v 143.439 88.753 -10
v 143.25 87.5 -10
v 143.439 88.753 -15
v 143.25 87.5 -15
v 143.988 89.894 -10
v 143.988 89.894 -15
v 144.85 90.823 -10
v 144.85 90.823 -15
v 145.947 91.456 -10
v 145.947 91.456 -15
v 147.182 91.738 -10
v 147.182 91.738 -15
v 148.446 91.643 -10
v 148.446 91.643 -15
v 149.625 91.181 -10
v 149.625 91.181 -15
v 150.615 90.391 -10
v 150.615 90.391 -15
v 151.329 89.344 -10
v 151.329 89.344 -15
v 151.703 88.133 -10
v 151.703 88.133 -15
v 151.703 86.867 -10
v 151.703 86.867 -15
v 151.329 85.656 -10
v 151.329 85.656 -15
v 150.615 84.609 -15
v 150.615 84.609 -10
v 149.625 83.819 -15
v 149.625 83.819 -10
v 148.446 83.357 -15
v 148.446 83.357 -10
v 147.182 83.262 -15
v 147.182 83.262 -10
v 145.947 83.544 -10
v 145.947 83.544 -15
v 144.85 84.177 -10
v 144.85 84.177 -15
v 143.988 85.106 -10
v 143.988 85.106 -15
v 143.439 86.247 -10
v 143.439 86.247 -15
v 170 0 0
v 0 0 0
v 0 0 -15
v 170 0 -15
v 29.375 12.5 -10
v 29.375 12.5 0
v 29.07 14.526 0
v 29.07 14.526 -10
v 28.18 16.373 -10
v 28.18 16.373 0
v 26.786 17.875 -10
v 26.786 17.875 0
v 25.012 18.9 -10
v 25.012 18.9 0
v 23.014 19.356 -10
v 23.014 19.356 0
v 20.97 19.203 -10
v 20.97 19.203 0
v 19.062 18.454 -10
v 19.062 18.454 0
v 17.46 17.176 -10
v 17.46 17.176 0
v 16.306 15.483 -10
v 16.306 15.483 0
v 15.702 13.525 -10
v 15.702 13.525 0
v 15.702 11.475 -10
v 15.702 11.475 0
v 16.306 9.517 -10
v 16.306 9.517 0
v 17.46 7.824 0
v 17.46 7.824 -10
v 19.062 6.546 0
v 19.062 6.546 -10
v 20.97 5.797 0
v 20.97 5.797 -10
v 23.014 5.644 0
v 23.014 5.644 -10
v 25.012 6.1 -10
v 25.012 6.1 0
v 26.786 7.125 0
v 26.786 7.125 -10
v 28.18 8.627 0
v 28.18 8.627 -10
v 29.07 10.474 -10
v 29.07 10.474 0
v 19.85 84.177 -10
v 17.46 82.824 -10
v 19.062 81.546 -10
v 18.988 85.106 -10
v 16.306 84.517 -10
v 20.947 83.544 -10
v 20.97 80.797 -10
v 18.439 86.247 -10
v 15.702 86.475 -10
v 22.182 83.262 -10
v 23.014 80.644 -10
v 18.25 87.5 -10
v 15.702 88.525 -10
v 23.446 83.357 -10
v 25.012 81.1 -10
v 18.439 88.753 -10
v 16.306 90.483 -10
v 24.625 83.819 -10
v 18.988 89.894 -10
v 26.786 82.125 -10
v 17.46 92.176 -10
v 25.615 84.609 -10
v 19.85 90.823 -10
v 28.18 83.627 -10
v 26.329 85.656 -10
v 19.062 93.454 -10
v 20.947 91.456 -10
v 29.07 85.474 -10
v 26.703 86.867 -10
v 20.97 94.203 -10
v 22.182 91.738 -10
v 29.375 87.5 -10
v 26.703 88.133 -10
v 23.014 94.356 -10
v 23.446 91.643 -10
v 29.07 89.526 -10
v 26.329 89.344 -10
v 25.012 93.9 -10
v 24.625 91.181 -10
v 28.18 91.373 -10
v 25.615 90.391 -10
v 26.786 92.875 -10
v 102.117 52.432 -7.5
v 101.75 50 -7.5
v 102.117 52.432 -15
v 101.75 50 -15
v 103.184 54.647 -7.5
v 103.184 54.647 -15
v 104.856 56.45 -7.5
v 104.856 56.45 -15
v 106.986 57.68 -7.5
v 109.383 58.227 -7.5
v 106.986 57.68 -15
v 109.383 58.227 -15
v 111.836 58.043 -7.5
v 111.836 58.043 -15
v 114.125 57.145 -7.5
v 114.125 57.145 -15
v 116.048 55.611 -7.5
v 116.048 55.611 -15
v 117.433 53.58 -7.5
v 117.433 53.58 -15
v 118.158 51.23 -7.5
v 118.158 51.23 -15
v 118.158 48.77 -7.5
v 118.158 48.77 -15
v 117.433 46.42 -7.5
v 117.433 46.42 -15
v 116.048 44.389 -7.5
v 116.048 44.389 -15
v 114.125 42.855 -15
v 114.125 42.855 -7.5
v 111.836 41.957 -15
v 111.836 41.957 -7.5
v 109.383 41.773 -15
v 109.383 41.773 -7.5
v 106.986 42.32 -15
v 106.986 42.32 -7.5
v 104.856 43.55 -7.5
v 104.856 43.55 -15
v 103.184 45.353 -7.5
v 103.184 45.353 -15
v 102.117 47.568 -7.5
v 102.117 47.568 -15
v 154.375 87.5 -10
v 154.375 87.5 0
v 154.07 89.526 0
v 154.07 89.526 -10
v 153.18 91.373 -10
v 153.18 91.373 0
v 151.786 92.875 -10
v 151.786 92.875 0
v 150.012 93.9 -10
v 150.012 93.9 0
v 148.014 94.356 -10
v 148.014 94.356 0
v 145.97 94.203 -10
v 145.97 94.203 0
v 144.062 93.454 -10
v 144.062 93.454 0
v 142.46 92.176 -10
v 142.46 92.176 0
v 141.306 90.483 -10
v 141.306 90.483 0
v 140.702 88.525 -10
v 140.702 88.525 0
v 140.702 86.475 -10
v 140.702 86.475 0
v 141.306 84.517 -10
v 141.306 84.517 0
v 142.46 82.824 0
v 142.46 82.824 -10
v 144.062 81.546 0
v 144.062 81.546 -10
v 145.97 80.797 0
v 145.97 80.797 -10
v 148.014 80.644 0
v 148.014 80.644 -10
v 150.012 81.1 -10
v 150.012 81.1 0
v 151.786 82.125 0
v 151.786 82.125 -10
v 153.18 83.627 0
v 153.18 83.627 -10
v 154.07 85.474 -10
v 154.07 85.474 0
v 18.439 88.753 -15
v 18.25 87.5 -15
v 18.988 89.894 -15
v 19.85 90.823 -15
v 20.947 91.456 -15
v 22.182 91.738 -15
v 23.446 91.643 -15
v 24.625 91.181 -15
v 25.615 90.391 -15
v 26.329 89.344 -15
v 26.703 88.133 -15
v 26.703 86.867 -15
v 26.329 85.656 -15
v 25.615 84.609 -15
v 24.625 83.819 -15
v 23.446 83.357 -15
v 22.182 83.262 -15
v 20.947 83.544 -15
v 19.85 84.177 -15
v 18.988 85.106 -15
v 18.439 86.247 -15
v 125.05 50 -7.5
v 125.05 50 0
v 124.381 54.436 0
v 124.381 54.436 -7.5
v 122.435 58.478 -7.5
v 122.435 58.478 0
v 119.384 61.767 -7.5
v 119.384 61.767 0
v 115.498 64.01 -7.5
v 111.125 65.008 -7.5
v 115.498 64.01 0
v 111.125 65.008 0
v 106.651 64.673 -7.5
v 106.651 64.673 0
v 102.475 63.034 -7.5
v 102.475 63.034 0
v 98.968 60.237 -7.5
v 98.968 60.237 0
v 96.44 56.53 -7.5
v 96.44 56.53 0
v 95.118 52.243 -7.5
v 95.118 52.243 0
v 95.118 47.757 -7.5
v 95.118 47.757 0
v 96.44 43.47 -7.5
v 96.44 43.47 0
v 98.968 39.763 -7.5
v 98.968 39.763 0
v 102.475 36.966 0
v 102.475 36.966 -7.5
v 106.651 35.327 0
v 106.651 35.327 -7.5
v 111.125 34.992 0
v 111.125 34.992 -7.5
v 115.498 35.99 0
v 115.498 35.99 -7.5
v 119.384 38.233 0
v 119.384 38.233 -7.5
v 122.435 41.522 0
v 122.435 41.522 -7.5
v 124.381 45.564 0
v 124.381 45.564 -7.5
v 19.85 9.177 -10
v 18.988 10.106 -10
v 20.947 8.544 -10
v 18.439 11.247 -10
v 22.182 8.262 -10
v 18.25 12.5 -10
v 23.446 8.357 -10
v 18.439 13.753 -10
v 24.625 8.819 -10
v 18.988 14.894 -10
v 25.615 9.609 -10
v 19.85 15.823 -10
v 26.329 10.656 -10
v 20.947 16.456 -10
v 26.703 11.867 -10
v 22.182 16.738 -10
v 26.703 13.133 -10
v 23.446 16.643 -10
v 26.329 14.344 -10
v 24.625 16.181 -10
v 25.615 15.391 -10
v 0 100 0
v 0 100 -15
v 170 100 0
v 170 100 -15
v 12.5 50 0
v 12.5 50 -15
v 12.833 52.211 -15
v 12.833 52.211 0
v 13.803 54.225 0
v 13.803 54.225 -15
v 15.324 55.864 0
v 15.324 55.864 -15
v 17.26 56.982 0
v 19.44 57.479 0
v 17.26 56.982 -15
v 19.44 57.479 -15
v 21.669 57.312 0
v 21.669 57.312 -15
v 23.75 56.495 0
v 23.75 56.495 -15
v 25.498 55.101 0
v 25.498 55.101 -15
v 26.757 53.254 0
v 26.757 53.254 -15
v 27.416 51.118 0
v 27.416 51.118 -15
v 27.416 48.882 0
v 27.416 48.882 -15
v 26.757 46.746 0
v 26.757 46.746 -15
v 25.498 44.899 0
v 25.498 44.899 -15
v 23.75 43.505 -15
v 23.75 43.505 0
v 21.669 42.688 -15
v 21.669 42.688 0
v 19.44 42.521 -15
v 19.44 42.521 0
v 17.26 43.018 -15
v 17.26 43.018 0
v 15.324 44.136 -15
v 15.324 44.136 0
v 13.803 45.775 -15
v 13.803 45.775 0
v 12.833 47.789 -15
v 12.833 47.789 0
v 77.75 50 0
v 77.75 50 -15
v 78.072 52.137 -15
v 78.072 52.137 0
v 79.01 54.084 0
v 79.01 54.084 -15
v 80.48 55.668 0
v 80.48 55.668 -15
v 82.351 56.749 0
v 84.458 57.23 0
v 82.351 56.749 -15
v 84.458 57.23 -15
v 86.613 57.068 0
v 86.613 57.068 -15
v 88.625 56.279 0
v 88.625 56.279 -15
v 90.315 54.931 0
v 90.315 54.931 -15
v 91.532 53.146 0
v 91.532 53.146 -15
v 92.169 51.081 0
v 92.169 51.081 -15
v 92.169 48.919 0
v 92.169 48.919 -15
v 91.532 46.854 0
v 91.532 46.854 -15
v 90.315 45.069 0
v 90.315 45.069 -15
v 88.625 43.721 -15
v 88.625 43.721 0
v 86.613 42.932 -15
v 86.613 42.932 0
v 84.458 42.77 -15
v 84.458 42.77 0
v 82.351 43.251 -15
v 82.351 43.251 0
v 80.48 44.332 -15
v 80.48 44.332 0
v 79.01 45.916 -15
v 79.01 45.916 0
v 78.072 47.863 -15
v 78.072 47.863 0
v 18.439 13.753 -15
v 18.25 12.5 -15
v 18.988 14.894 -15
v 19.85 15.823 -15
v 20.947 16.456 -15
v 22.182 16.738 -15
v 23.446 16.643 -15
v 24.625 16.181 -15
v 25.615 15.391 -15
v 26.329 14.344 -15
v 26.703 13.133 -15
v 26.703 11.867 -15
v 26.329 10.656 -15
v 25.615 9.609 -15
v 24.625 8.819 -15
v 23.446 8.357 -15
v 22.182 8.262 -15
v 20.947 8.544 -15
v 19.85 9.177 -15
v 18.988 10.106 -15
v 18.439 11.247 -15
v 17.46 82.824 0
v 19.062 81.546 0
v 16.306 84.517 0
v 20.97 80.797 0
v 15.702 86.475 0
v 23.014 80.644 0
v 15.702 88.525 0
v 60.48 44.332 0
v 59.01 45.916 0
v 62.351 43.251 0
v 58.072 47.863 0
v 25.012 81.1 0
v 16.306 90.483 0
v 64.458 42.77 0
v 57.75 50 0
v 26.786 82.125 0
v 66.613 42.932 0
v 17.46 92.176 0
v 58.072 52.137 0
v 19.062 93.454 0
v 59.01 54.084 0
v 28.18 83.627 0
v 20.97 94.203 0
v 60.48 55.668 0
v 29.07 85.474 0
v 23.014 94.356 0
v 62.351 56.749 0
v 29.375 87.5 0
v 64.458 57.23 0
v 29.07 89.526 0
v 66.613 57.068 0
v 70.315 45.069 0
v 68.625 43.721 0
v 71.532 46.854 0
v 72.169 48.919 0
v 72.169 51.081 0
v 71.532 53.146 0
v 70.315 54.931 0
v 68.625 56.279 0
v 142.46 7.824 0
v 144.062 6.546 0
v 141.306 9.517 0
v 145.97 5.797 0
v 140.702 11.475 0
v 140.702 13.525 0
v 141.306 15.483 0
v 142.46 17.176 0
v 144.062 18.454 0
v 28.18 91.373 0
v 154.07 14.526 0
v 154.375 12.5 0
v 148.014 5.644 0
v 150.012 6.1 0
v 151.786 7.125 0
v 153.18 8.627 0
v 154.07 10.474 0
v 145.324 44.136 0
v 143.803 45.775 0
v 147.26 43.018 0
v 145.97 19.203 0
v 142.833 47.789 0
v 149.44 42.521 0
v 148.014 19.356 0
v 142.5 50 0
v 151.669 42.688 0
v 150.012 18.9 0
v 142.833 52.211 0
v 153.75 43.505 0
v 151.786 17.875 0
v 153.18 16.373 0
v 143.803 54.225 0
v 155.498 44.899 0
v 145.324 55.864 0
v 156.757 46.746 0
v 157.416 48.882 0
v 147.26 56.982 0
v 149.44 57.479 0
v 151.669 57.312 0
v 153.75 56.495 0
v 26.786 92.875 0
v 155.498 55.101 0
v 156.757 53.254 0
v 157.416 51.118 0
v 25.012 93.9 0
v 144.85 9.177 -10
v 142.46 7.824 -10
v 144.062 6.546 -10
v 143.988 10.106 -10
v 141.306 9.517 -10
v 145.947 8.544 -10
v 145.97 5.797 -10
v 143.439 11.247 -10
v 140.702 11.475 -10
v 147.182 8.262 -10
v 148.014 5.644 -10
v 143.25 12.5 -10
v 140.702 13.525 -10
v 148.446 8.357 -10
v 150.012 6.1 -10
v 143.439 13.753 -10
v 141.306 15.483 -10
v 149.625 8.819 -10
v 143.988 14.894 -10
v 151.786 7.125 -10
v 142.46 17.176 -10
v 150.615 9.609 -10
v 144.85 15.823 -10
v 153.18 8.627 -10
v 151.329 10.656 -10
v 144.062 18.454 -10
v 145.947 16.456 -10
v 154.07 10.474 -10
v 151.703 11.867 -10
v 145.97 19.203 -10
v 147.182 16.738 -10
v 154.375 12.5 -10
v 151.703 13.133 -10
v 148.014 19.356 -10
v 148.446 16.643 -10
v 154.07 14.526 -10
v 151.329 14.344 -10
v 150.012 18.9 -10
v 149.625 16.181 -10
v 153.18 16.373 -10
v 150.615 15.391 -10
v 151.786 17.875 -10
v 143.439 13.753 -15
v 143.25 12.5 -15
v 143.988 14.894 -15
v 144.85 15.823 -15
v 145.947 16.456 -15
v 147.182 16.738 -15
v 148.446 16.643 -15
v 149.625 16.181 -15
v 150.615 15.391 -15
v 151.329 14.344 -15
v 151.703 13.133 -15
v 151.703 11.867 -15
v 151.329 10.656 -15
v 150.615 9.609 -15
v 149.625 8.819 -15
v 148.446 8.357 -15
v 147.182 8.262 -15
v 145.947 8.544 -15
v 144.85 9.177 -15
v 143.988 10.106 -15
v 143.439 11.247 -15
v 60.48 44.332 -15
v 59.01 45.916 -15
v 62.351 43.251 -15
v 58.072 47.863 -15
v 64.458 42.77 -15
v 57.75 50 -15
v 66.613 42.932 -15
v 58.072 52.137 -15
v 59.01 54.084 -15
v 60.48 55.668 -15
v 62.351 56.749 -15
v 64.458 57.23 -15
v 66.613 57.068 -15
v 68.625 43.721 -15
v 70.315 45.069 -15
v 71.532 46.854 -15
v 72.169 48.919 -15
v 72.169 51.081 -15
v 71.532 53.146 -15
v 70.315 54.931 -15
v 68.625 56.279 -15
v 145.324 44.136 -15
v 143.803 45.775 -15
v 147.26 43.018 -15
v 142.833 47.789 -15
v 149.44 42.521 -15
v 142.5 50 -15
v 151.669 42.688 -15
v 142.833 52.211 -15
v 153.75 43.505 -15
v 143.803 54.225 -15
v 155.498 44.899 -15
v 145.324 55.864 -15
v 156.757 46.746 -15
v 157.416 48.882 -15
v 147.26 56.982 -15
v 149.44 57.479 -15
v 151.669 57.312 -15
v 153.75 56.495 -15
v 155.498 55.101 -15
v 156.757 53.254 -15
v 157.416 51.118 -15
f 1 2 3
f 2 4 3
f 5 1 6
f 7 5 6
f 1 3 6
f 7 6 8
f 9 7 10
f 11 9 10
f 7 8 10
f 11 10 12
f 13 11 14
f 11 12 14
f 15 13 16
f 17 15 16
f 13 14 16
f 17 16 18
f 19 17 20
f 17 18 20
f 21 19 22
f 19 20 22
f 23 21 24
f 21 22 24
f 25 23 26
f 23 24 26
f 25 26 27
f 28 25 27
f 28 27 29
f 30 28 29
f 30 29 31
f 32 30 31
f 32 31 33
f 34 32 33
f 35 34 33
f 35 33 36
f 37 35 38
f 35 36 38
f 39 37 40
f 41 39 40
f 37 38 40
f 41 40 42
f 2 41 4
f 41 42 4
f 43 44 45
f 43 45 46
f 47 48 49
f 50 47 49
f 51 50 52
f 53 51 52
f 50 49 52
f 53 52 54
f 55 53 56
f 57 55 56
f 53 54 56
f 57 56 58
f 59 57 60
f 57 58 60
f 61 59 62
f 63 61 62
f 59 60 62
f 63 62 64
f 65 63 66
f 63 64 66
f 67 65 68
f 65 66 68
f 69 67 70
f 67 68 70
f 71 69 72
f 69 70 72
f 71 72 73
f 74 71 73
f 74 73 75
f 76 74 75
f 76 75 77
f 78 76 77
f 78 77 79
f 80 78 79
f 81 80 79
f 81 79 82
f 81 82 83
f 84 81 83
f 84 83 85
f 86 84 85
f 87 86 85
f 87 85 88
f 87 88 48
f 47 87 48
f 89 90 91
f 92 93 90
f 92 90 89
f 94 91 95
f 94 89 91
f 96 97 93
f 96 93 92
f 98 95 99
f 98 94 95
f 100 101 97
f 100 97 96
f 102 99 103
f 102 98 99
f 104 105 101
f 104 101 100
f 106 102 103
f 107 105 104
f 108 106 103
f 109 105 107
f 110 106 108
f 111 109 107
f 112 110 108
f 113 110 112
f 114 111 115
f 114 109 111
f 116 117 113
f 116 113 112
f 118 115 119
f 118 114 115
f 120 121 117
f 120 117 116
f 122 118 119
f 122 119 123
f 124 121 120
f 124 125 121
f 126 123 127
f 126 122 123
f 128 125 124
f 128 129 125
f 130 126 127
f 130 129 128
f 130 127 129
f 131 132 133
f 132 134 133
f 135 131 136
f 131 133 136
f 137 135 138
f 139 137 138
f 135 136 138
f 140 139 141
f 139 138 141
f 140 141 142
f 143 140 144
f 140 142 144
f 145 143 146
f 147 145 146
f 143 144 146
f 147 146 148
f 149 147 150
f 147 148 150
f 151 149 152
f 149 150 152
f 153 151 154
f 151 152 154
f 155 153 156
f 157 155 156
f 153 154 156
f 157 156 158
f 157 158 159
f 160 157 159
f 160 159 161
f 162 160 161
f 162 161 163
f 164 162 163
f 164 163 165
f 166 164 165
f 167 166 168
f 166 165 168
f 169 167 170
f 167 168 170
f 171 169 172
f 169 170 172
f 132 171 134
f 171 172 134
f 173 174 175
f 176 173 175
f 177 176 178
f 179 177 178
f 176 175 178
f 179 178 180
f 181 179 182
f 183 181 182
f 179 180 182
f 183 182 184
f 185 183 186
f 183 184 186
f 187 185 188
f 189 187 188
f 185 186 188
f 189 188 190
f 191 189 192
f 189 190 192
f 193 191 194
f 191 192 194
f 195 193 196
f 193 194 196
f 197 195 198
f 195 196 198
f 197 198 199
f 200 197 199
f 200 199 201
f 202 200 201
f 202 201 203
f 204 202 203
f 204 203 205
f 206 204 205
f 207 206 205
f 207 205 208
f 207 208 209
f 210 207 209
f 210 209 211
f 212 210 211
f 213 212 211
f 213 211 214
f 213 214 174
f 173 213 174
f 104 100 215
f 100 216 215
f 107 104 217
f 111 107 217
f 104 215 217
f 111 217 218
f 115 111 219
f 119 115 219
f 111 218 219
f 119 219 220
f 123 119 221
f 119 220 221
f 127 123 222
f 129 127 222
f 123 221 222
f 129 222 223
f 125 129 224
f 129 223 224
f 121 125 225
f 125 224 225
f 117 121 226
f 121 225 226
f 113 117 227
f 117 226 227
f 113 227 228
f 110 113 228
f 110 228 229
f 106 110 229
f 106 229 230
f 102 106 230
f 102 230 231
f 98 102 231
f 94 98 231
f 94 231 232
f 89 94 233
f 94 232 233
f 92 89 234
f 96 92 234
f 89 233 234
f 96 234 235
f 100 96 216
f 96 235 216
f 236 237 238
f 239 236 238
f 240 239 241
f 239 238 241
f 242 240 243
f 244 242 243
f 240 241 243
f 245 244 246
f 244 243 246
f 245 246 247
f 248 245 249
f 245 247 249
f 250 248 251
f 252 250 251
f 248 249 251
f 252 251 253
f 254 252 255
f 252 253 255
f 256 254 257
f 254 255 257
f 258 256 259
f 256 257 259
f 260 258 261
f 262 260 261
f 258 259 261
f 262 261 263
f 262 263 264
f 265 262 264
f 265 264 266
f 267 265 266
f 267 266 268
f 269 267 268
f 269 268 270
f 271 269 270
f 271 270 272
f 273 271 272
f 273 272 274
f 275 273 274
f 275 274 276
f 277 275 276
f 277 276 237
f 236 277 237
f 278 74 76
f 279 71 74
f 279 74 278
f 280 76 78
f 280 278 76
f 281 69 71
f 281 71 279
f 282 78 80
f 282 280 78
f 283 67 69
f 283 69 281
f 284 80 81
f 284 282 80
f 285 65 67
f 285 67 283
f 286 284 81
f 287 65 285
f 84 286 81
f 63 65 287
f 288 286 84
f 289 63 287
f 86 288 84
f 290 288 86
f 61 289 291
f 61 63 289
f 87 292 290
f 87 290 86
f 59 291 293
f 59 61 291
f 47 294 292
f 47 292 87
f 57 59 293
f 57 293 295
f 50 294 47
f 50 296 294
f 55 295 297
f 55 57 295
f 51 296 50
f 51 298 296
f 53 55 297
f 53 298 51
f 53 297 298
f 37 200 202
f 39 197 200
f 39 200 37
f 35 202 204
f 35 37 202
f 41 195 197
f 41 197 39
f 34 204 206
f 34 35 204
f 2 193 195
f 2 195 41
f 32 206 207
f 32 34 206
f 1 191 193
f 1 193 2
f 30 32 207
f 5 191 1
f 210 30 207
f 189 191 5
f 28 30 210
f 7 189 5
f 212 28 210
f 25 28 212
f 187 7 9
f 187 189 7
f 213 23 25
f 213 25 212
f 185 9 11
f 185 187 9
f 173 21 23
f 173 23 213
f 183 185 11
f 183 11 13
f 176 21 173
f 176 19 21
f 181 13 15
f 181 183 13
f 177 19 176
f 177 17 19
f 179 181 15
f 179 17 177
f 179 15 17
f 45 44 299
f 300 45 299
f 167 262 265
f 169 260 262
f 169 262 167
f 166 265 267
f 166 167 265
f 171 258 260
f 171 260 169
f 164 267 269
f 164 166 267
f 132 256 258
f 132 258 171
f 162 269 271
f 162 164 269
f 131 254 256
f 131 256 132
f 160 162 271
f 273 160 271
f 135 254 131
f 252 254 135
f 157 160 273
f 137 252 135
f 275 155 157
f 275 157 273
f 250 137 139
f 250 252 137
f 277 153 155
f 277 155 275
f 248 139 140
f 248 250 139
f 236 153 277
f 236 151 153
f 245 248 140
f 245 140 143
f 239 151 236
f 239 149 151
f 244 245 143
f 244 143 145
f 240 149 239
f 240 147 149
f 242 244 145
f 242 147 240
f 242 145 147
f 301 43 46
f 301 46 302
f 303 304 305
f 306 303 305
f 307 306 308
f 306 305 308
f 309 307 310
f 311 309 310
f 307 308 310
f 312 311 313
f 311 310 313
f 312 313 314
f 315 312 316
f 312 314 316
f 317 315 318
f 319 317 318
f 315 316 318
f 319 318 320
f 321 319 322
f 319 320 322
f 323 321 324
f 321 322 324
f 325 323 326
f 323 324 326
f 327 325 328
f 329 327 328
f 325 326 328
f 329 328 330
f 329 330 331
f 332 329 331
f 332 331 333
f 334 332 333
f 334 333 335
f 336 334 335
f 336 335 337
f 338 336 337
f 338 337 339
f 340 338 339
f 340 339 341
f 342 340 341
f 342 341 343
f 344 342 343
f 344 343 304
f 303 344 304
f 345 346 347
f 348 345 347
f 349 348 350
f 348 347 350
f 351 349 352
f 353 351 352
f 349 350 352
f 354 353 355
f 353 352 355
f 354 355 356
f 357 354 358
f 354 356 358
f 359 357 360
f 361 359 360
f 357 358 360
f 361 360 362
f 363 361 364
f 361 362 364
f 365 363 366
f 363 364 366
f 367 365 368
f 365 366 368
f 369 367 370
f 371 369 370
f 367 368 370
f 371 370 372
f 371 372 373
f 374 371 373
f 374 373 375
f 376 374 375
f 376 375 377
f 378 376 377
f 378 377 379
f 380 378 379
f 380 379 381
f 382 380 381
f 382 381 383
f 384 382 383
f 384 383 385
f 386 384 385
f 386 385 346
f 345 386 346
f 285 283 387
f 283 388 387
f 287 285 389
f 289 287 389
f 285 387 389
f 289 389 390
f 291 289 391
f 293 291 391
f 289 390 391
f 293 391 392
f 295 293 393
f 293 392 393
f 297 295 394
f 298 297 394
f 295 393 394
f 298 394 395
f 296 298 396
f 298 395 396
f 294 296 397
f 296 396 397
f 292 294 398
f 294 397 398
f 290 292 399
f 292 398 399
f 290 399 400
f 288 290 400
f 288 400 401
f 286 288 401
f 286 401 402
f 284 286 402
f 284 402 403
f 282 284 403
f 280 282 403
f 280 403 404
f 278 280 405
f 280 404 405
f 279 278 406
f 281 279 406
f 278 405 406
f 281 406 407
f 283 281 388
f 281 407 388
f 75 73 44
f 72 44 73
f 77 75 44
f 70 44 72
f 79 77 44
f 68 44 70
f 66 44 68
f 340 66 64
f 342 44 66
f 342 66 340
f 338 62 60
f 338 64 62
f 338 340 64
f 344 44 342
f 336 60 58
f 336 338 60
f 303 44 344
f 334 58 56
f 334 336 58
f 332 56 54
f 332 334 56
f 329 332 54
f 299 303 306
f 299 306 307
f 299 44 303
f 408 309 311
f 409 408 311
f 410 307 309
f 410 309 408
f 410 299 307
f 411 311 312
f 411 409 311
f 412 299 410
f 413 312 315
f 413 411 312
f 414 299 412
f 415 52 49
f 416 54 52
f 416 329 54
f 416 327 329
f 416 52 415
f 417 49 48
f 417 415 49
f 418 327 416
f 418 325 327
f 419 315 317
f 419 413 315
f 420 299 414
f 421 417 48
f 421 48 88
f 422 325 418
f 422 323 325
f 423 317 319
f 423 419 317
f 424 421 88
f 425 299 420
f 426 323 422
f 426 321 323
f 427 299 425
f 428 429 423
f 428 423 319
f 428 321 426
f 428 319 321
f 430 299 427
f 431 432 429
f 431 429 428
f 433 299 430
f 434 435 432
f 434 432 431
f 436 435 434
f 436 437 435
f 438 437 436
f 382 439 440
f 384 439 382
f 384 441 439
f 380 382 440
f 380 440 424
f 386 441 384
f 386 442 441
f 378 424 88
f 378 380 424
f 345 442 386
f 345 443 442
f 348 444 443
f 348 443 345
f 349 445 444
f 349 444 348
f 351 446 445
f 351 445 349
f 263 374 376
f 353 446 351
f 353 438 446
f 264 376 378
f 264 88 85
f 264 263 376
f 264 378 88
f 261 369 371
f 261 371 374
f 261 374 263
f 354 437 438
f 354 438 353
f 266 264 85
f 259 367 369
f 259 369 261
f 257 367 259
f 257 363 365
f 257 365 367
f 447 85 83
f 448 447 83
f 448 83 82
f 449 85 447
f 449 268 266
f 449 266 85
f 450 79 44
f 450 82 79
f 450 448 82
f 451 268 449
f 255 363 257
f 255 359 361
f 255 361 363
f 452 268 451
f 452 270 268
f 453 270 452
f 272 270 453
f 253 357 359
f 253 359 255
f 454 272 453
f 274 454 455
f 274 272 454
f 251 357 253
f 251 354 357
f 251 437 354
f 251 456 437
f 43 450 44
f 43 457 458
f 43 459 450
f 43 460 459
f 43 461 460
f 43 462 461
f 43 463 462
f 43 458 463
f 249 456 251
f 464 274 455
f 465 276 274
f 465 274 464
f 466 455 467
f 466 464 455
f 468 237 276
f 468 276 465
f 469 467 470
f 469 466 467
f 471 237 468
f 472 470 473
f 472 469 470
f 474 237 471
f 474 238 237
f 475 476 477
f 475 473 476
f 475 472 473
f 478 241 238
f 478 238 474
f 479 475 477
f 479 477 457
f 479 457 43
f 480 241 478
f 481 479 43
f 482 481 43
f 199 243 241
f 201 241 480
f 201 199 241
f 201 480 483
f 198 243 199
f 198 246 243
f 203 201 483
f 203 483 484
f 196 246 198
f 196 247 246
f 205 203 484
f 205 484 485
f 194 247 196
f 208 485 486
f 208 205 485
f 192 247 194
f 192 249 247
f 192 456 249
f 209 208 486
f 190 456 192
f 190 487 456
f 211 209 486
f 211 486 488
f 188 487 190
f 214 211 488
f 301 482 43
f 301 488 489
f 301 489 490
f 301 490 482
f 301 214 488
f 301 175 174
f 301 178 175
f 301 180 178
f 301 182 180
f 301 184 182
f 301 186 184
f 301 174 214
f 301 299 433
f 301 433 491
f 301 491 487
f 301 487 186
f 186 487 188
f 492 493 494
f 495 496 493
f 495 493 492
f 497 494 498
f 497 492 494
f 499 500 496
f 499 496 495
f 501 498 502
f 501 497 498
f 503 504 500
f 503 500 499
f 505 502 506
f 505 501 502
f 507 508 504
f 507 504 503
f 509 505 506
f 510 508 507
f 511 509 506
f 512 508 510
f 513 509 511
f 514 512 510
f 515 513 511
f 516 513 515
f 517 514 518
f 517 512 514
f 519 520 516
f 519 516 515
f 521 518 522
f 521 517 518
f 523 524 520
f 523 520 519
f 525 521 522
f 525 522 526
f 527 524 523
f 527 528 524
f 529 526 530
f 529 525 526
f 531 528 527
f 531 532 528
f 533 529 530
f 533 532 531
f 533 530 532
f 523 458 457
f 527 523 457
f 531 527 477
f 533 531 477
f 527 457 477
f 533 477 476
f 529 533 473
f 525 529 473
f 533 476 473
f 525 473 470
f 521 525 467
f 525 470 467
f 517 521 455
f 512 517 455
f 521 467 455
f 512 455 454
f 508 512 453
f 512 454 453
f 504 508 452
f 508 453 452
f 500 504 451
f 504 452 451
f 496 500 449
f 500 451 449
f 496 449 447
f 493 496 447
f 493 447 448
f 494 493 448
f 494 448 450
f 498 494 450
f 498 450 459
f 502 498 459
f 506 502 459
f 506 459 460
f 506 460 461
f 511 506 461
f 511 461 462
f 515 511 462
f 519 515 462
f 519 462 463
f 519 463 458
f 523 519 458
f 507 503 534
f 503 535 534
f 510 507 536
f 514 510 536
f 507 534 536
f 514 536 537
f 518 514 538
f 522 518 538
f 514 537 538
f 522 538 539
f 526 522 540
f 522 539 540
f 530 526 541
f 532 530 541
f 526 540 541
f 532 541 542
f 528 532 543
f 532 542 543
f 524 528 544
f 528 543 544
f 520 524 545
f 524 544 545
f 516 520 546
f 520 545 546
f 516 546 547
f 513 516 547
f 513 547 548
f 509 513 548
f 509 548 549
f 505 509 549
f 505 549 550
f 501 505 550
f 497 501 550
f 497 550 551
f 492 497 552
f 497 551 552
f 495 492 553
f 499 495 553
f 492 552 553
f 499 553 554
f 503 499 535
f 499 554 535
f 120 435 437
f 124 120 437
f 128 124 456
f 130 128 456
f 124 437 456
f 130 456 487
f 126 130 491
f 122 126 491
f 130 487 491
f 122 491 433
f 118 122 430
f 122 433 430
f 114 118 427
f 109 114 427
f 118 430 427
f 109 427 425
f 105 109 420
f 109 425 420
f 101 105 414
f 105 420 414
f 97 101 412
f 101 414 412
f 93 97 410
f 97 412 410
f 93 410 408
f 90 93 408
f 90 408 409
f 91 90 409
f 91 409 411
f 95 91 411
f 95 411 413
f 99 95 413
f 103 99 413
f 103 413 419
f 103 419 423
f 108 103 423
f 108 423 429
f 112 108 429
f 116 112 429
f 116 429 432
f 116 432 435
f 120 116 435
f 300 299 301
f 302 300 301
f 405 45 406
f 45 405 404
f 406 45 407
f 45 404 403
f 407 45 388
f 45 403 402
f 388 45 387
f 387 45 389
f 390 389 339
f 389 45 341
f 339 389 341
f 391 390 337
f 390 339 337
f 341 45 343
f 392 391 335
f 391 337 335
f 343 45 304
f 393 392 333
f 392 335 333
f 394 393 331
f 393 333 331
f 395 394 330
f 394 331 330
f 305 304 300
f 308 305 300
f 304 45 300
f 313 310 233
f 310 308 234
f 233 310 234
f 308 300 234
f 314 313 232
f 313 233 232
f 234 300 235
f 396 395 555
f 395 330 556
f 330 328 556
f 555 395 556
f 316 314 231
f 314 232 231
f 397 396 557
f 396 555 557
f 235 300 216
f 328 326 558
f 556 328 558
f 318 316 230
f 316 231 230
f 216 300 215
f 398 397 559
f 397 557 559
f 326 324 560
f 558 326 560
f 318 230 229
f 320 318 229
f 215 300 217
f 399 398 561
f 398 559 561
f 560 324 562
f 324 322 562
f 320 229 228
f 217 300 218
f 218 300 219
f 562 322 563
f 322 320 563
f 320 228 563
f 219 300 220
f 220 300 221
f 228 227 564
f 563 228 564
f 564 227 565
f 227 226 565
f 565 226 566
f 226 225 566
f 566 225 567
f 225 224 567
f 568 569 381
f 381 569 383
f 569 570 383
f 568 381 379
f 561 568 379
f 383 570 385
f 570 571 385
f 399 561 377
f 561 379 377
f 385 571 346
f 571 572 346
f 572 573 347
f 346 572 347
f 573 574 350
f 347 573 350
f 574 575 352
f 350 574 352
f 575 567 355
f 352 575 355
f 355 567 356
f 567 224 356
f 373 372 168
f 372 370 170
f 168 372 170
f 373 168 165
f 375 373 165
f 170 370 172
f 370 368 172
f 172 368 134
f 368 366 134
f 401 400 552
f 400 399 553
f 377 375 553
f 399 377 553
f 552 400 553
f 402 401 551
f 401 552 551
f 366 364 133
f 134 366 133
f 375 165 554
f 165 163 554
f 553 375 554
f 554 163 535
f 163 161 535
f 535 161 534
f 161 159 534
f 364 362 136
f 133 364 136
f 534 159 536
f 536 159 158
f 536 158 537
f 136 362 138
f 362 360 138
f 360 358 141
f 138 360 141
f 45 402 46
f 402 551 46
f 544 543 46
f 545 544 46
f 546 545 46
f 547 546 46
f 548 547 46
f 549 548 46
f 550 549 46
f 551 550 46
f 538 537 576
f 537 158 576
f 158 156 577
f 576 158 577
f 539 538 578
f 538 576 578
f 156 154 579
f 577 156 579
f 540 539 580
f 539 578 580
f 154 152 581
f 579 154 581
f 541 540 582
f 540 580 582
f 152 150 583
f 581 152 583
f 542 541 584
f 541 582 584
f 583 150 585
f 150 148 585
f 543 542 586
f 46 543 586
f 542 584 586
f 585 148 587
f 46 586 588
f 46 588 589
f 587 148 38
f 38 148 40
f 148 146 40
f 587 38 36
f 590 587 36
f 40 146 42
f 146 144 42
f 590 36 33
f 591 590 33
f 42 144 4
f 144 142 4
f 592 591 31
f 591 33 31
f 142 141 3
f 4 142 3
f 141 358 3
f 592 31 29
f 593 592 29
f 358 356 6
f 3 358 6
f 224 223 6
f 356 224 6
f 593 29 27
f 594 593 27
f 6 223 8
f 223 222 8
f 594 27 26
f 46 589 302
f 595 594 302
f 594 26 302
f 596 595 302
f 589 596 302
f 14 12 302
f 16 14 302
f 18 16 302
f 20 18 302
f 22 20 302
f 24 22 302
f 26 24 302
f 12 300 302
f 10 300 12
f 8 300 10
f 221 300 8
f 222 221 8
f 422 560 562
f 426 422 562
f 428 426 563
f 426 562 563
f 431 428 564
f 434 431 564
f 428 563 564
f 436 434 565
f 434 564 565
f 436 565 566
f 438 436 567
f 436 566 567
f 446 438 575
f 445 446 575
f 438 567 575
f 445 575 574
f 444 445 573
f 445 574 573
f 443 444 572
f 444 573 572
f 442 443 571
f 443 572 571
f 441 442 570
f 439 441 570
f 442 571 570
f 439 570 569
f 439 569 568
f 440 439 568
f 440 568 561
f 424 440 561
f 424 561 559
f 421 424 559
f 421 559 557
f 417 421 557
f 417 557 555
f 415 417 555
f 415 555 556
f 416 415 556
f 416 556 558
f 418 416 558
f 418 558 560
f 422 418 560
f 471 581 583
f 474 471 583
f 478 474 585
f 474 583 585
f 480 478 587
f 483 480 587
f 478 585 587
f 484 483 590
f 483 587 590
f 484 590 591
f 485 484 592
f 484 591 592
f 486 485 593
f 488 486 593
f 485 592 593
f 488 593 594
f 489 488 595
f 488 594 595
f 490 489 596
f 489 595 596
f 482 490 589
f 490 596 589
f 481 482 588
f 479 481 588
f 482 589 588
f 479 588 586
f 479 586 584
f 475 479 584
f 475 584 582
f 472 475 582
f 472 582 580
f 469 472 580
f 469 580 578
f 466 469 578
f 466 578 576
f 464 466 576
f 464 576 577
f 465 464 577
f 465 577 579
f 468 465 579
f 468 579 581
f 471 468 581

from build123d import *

# Parameters (mm, degrees)
F0_W           = 170
F0_H           = 100
F1_DEPTH       = 15
F3_D           = 8.5
F3_CBORE_D     = 13.75
F3_CBORE_DEPTH = 10
F5_D           = 15
F7_D           = 14.5
F9_D           = 16.5
F9_CBORE_D     = 30.1
F9_CBORE_DEPTH = 7.5


with BuildPart() as f1:
    # F0 (on Top) → F1 (new body)
    with BuildSketch(Plane.XY):
        with Locations((85, 50)):
            Rectangle(F0_W, F0_H)
    extrude(amount=-F1_DEPTH)

    # F3 (through all)
    with Locations(Plane.XY):
        with Locations((22.5, 87.5), (22.5, 12.5), (147.5, 87.5), (147.5, 12.5)):
            CounterBoreHole(F3_D / 2, F3_CBORE_D / 2, F3_CBORE_DEPTH)

    # F5 (through all)
    with Locations(Plane.XY):
        with Locations((20, 50), (150, 50)):
            Hole(F5_D / 2)

    # F7 (through all)
    with Locations(Plane.XY):
        with Locations((65, 50), (85, 50)):
            Hole(F7_D / 2)

    # F9 (through all)
    with Locations(Plane.XY):
        with Locations((110, 50)):
            CounterBoreHole(F9_D / 2, F9_CBORE_D / 2, F9_CBORE_DEPTH)


solid = f1.part
